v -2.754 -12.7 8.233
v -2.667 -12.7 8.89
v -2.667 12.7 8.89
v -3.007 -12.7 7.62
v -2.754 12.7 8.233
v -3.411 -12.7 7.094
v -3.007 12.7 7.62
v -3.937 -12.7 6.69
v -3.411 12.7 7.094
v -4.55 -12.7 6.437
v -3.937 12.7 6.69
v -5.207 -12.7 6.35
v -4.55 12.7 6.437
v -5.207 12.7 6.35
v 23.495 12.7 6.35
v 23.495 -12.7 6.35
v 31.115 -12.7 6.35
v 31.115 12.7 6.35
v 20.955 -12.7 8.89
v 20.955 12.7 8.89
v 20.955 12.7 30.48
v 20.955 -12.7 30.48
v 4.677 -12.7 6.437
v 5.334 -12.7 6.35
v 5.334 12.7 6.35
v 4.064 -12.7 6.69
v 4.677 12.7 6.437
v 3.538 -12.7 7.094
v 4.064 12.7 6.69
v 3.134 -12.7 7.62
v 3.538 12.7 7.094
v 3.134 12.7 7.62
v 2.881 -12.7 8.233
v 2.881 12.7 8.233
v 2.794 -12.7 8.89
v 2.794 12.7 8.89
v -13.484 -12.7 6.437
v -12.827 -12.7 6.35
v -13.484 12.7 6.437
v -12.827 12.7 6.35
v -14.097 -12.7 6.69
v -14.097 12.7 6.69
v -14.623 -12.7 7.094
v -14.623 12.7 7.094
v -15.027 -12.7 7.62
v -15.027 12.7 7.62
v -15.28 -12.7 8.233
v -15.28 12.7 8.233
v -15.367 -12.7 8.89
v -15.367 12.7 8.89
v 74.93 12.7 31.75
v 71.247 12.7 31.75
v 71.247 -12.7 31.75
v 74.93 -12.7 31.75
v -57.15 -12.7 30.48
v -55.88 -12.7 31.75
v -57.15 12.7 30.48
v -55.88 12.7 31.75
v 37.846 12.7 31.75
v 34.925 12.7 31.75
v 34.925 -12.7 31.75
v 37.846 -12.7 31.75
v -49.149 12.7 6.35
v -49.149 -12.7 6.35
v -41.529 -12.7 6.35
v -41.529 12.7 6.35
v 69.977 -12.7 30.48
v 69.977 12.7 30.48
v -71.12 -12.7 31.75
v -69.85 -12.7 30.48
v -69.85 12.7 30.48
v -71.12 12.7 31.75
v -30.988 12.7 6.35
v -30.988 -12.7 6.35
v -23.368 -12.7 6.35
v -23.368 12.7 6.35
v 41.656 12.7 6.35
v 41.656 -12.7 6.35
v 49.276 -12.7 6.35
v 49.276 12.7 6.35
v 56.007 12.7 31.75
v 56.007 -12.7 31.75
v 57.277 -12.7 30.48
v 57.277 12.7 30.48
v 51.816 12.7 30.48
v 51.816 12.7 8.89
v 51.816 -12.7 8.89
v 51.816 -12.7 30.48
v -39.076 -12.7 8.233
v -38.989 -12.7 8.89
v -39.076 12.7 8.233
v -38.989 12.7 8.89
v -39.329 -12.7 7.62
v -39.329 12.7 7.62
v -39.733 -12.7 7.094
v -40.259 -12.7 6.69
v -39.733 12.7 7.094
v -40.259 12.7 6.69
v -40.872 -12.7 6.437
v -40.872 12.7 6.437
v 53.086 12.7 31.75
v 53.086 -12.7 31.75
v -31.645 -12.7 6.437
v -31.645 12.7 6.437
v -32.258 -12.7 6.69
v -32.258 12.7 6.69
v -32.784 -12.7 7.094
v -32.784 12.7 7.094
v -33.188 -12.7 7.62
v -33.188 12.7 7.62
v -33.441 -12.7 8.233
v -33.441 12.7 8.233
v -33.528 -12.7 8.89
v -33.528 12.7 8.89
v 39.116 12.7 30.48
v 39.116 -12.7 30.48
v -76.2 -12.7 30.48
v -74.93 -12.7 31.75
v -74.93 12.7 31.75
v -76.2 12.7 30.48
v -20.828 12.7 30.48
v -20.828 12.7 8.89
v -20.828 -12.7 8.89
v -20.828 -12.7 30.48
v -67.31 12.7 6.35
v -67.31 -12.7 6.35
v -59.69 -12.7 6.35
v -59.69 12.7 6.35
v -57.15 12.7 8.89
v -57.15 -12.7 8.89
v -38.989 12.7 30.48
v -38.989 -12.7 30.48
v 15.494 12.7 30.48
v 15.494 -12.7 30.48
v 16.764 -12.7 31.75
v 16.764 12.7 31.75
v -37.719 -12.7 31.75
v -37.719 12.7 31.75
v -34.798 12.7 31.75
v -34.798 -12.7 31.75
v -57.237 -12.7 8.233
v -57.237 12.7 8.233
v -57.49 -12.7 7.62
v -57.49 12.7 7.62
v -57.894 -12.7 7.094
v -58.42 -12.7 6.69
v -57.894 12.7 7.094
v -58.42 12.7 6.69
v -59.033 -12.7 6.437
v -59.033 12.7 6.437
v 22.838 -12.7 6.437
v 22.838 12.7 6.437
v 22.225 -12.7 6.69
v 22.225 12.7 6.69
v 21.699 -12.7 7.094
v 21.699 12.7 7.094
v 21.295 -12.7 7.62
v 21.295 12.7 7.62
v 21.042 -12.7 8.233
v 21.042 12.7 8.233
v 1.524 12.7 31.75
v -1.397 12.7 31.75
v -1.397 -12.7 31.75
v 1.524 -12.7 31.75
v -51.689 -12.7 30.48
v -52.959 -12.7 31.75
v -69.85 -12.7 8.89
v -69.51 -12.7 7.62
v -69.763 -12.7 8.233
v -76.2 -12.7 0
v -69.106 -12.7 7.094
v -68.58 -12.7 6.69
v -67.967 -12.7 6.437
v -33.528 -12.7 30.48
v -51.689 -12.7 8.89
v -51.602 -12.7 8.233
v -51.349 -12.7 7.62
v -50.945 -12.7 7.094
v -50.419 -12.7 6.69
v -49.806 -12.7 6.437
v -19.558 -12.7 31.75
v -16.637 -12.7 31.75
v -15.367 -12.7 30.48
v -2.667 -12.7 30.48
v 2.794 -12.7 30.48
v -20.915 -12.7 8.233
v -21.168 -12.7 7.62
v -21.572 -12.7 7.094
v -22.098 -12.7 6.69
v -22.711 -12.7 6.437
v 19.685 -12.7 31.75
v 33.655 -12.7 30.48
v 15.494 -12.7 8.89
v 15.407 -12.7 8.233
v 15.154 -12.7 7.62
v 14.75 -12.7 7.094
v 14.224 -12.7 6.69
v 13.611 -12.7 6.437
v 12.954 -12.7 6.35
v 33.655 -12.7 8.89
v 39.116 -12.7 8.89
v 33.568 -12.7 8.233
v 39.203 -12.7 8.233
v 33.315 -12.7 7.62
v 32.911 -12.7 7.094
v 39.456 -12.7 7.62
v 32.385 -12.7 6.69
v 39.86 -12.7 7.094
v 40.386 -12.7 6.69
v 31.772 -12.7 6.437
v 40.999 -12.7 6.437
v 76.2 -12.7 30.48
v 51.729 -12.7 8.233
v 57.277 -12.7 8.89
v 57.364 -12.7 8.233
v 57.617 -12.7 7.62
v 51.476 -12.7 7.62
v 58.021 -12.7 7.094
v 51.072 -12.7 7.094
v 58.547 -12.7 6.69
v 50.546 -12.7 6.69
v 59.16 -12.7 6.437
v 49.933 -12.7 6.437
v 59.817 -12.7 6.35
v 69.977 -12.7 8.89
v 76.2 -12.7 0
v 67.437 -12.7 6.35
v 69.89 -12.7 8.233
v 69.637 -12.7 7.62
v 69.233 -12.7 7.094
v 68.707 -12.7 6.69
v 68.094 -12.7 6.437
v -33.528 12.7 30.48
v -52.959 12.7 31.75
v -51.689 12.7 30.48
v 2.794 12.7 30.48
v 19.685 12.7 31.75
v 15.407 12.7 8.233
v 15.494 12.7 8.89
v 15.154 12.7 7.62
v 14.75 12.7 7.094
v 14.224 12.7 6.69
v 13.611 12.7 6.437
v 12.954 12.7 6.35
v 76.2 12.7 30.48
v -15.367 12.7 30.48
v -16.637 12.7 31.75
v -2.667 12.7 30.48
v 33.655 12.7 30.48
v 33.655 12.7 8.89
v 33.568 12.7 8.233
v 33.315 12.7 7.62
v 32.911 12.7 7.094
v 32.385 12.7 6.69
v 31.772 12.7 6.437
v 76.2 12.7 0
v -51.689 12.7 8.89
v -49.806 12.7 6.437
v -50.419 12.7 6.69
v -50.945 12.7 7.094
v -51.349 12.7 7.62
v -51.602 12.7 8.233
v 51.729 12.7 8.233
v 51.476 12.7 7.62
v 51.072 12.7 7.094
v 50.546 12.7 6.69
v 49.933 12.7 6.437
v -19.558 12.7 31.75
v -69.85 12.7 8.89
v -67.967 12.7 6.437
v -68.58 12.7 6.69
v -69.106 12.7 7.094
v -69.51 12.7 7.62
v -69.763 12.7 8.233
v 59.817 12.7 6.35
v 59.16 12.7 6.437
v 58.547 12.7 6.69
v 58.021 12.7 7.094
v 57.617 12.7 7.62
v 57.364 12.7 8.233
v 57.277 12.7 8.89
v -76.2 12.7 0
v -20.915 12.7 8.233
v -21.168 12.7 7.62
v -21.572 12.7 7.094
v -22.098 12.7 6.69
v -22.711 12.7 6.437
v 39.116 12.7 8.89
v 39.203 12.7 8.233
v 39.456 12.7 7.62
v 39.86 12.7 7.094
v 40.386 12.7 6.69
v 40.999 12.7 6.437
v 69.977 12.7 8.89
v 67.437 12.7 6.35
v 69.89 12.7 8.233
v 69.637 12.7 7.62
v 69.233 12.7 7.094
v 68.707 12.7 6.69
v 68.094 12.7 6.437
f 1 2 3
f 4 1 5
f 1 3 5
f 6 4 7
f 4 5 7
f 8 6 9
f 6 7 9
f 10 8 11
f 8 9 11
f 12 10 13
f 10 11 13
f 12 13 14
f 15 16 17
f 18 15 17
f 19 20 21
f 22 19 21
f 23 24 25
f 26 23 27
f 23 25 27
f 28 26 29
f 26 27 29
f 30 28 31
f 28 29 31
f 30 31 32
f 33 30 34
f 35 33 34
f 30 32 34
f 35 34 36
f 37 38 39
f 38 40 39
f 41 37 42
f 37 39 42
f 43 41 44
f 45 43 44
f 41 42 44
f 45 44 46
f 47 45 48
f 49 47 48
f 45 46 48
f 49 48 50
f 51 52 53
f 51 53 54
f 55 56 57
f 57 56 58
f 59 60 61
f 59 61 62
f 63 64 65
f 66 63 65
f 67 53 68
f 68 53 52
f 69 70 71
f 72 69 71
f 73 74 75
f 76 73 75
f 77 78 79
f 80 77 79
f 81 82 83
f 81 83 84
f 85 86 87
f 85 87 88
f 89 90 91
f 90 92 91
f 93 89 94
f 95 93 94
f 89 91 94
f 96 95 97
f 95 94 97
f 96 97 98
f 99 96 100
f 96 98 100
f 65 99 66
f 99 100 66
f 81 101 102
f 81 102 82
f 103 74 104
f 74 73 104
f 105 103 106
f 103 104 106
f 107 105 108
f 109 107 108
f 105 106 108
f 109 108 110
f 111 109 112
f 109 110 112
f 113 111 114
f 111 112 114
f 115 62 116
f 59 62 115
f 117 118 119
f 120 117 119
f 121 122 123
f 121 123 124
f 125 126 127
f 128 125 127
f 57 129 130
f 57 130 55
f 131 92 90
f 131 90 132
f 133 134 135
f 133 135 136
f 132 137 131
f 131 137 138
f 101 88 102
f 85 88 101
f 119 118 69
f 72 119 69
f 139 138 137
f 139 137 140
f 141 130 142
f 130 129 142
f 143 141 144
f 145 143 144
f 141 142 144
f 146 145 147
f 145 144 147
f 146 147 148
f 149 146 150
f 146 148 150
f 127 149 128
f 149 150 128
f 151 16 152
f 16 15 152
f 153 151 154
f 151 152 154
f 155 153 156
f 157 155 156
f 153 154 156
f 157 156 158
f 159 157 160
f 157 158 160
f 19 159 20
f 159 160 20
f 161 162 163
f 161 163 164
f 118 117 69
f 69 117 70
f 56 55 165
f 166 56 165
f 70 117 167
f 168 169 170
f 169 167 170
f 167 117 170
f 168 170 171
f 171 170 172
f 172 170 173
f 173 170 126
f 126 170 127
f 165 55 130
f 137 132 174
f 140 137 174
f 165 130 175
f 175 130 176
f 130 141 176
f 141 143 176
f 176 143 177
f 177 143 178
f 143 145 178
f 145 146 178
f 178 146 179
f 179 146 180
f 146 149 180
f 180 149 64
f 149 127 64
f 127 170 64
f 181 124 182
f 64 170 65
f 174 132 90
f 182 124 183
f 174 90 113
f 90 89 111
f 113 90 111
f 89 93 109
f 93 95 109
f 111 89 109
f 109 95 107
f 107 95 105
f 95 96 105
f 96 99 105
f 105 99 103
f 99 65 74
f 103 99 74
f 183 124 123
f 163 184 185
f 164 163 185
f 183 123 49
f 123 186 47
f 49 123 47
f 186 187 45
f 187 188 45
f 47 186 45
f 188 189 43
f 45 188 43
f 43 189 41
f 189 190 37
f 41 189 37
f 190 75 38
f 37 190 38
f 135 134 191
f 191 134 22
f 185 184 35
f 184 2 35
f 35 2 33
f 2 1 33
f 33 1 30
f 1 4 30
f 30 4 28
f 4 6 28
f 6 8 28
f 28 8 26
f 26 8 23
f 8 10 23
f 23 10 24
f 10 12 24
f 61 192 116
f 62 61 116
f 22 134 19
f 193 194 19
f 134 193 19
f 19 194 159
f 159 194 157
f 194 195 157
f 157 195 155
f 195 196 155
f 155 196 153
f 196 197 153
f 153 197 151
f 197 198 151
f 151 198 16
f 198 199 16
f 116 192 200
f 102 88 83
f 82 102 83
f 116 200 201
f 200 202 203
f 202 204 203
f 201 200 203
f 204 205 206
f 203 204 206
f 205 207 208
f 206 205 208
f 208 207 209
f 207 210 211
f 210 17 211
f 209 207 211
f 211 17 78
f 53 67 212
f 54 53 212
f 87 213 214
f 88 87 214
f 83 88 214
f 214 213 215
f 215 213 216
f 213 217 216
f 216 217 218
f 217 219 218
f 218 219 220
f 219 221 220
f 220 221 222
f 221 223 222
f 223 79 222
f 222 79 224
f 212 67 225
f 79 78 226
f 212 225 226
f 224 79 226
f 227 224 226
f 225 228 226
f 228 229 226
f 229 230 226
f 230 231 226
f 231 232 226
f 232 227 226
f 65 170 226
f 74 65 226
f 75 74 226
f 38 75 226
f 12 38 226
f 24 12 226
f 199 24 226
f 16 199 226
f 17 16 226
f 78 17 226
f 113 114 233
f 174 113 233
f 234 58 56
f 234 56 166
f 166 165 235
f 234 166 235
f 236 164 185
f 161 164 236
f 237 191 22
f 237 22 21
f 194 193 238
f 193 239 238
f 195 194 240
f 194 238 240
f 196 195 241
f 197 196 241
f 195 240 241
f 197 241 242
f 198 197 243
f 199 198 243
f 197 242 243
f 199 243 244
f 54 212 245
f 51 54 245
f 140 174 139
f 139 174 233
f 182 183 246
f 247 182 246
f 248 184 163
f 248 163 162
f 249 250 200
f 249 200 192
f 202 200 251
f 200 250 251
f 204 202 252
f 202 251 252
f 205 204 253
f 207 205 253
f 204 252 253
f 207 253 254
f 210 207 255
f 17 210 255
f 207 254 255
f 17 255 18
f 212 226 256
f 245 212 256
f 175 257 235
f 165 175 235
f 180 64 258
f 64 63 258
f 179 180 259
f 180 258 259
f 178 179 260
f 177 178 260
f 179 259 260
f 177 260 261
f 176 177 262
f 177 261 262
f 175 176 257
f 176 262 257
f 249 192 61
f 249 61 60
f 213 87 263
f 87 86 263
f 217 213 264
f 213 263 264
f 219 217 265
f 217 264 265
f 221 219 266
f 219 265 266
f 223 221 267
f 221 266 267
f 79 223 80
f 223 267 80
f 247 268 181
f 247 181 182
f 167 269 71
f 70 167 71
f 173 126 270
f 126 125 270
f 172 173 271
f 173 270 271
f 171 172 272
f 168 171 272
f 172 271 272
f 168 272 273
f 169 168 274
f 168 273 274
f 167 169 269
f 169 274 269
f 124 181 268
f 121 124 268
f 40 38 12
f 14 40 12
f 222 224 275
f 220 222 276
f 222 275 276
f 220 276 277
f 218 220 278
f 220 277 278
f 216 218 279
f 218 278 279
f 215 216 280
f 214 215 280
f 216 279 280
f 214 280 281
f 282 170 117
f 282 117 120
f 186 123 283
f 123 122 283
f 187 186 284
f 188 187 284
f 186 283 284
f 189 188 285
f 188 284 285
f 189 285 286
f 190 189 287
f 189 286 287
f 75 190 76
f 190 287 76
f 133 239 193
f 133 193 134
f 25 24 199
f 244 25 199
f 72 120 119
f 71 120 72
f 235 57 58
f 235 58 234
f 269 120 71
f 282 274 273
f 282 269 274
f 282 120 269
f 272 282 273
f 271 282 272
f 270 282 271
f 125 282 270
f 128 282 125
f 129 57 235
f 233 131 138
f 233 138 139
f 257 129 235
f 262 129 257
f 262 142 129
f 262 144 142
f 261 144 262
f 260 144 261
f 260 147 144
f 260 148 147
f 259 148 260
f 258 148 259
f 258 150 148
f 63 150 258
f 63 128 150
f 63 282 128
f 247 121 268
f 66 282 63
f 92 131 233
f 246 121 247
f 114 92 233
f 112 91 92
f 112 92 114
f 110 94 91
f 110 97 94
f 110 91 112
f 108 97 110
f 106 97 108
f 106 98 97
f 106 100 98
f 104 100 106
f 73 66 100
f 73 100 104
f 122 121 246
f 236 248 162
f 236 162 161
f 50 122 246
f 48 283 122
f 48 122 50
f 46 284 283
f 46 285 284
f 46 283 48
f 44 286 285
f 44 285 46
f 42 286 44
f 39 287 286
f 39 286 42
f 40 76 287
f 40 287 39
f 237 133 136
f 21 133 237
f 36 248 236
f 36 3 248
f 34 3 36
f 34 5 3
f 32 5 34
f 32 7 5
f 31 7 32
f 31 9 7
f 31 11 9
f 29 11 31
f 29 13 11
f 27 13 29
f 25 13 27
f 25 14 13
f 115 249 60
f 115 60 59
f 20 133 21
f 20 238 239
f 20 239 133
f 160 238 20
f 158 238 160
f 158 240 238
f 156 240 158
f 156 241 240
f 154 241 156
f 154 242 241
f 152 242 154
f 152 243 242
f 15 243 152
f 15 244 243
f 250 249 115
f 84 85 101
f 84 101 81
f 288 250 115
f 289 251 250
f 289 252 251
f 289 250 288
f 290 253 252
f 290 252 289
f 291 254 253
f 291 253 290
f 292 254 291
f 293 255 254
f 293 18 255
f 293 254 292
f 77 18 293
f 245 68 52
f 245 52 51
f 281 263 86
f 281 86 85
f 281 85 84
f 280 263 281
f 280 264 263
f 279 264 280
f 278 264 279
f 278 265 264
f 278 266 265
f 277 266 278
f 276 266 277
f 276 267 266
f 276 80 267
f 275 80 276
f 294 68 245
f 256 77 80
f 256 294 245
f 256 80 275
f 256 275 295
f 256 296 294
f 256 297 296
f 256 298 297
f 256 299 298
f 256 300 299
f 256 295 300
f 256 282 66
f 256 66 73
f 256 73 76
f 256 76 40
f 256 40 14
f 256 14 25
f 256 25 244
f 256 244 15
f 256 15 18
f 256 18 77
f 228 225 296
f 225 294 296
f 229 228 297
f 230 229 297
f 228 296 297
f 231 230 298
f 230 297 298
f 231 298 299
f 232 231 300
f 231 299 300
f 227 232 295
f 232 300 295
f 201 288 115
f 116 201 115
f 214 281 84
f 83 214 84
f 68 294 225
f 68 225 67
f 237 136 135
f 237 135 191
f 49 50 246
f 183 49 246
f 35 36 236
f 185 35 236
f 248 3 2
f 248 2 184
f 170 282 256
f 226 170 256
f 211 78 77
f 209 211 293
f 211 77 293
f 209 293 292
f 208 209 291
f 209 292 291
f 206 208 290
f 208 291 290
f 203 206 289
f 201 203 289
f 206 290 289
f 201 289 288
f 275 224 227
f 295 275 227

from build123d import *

# Parameters (mm, degrees)
F0_W     = 152.4
F0_H     = 25.4
F1_DEPTH = 31.75
F2_W     = 12.7
F2_H     = 25.4
F3_DEPTH = 25.401
F4_R     = 2.54
F5_SIZE  = 1.27


with BuildPart() as f1:
    # F0 (on Top) → F1 (new body)
    with BuildSketch(Plane.XY):
        Rectangle(F0_W, F0_H)
    extrude(amount=F1_DEPTH)

    # F2 (on face) → F3 (cut, through all)
    with BuildSketch(Plane.XZ.offset(12.7)):
        with Locations((-63.5, 19.05)):
            Rectangle(F2_W, F2_H)
        with Locations((-45.339, 19.05)):
            Rectangle(F2_W, F2_H)
        with Locations((-27.178, 19.05)):
            Rectangle(F2_W, F2_H)
        with Locations((-9.017, 19.05)):
            Rectangle(F2_W, F2_H)
        with Locations((9.144, 19.05)):
            Rectangle(F2_W, F2_H)
        with Locations((27.305, 19.05)):
            Rectangle(F2_W, F2_H)
        with Locations((45.466, 19.05)):
            Rectangle(F2_W, F2_H)
        with Locations((63.627, 19.05)):
            Rectangle(F2_W, F2_H)
    extrude(amount=-F3_DEPTH, mode=Mode.SUBTRACT)

    # F4
    f4_edges = [f1.edges().sort_by_distance(p)[0] for p in [
        (-69.85, 0, 6.35),
        (-57.15, 0, 6.35),
        (-38.989, 0, 6.35),
        (-20.828, 0, 6.35),
        (-2.667, 0, 6.35),
        (15.494, 0, 6.35),
        (33.655, 0, 6.35),
        (51.816, 0, 6.35),
        (69.977, 0, 6.35),
        (57.277, 0, 6.35),
        (39.116, 0, 6.35),
        (20.955, 0, 6.35),
        (2.794, 0, 6.35),
        (-15.367, 0, 6.35),
        (-33.528, 0, 6.35),
        (-51.689, 0, 6.35),
    ]]
    fillet(f4_edges, radius=F4_R)

    # F5
    f5_edges = [f1.edges().sort_by_distance(p)[0] for p in [
        (-69.85, 0, 31.75),
        (-76.2, 0, 31.75),
        (-57.15, 0, 31.75),
        (-51.689, 0, 31.75),
        (-38.989, 0, 31.75),
        (-33.528, 0, 31.75),
        (-20.828, 0, 31.75),
        (-15.367, 0, 31.75),
        (-2.667, 0, 31.75),
        (2.794, 0, 31.75),
        (15.494, 0, 31.75),
        (20.955, 0, 31.75),
        (33.655, 0, 31.75),
        (39.116, 0, 31.75),
        (51.816, 0, 31.75),
        (57.277, 0, 31.75),
        (69.977, 0, 31.75),
        (76.2, 0, 31.75),
    ]]
    chamfer(f5_edges, length=F5_SIZE)


solid = f1.part
